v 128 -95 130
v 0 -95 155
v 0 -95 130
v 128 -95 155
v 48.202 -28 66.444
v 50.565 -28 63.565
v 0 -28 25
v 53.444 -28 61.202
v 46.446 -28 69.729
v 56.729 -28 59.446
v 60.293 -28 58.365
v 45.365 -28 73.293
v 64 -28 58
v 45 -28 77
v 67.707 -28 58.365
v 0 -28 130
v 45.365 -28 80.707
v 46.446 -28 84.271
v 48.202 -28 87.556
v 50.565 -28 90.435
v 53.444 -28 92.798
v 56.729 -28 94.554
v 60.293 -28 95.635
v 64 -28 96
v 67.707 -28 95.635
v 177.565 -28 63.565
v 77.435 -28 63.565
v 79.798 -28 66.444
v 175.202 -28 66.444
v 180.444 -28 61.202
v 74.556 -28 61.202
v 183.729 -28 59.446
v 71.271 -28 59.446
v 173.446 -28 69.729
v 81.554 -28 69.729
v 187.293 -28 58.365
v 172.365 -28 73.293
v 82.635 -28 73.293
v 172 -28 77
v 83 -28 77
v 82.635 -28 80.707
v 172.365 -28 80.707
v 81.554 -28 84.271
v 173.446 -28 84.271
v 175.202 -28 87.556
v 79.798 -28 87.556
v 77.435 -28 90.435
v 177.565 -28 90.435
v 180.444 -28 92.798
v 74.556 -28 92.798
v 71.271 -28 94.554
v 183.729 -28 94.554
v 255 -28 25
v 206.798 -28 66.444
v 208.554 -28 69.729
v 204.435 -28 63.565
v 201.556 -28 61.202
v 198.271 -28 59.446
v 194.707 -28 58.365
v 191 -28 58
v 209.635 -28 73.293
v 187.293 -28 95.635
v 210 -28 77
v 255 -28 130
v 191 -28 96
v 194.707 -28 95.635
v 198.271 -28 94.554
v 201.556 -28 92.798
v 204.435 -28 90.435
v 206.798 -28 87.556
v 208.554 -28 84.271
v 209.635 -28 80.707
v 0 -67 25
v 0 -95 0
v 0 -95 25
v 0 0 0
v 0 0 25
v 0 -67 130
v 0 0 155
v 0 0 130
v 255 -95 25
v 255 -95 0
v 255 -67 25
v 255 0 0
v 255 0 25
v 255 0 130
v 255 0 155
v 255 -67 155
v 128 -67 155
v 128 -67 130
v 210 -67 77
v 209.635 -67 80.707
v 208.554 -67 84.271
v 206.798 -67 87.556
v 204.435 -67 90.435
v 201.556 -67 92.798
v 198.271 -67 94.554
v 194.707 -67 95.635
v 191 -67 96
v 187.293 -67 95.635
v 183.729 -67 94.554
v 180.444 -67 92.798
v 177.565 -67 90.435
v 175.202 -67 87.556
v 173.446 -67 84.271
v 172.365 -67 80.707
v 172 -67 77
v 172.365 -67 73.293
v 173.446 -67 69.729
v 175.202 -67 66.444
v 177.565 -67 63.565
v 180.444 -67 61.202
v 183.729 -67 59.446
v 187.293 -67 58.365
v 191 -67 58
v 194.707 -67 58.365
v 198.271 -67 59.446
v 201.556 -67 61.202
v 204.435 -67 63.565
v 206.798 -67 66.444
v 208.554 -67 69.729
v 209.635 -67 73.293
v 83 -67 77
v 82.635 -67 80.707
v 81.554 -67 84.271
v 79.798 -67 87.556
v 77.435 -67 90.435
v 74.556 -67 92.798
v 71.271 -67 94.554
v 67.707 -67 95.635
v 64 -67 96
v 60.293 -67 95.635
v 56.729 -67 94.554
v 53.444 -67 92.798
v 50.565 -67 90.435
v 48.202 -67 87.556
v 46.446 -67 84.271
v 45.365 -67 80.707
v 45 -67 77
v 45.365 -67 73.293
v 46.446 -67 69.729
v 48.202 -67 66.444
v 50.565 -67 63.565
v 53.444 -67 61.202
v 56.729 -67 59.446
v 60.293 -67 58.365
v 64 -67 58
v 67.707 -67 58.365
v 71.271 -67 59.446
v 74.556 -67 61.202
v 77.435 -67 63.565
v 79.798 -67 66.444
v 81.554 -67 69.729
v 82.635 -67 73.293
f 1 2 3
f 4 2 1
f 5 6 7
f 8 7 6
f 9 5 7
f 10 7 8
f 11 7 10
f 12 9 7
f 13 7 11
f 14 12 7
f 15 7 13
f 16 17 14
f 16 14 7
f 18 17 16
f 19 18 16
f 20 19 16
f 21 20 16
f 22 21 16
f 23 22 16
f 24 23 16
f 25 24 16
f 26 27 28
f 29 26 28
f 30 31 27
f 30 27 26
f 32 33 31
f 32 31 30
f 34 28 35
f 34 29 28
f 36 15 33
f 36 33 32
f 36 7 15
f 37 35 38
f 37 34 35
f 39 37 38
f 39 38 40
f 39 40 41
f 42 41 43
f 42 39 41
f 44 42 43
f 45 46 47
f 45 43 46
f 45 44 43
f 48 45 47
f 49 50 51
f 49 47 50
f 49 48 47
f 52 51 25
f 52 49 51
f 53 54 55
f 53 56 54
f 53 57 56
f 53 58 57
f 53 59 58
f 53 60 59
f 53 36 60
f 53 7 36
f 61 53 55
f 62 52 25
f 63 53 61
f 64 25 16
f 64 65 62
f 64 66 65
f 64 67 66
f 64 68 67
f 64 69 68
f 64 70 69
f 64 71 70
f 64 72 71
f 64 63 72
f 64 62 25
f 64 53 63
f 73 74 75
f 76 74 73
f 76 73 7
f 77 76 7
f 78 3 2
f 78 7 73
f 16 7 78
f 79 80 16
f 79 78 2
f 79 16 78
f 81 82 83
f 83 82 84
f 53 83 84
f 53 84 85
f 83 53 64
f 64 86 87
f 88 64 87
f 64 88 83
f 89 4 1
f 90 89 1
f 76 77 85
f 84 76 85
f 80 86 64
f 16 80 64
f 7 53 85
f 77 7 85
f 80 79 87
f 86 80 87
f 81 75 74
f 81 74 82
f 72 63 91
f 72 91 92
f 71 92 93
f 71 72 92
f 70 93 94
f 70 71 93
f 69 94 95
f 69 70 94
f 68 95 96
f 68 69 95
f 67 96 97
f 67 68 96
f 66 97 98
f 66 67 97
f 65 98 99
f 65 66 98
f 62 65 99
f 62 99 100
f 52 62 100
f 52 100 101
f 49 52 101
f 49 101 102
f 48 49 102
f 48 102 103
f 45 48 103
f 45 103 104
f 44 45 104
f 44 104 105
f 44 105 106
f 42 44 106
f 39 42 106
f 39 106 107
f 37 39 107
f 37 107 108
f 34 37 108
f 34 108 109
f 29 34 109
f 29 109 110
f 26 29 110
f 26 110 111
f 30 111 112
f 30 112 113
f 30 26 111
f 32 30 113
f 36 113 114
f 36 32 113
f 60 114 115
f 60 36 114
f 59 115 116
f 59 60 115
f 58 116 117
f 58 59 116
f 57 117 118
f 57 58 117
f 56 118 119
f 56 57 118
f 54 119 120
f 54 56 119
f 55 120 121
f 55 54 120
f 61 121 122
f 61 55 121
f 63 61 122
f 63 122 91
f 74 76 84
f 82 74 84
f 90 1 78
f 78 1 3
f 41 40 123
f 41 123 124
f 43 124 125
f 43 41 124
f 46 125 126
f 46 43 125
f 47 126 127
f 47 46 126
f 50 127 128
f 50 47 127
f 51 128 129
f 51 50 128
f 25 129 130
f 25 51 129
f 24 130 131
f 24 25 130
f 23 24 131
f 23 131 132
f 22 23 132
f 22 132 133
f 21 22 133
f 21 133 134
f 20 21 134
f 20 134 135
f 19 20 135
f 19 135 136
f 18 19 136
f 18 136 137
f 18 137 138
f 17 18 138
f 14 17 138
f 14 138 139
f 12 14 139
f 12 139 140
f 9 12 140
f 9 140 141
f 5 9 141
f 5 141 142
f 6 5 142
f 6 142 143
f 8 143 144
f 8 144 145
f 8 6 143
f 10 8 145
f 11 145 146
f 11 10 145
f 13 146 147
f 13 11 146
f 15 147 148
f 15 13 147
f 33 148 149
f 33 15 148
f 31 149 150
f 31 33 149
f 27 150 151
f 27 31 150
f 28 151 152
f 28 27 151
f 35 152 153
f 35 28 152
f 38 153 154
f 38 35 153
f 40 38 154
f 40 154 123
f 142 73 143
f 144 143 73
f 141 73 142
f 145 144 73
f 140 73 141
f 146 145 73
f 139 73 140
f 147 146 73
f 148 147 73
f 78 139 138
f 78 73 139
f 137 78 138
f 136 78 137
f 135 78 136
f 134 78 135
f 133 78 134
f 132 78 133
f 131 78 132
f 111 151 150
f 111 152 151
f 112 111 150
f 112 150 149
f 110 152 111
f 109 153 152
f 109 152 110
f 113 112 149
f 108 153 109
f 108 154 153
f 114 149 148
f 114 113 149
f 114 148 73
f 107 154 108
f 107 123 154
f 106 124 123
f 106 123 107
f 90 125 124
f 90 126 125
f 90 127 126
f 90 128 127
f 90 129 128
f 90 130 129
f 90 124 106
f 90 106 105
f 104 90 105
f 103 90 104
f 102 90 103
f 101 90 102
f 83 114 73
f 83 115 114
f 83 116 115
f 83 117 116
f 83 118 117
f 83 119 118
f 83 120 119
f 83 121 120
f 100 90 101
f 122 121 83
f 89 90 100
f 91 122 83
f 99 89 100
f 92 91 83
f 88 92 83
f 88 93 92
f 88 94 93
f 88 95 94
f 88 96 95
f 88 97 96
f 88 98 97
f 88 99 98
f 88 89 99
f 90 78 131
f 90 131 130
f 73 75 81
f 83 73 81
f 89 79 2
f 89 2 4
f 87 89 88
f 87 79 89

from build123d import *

# Parameters (mm, degrees)
F0_W     = 255
F0_H     = 155
F0_R     = 19
F1_DEPTH = 95
F2_R     = 19
F2_W     = 50
F2_H     = 105
F2_W_2   = 127
F2_H_2   = 25
F3_DEPTH = 28
F4_W     = 41.4112506824
F4_H     = 105
F4_W_2   = 28
F5_DEPTH = 255.001


with BuildPart() as f1:
    # F0 (on Front) → F1 (new body)
    with BuildSketch(Plane.XZ):
        with Locations((127.5, 77.5)):
            Rectangle(F0_W, F0_H)
        with Locations((64, 77)):
            Circle(F0_R, mode=Mode.SUBTRACT)
        with Locations((191, 77)):
            Circle(F0_R, mode=Mode.SUBTRACT)
    extrude(amount=F1_DEPTH)

    # F2 (on face) → F3 (cut)
    with BuildSketch(Plane.XZ.offset(95)):
        Polygon((128, 130), (0, 130), (0, 25), (255, 25), (255, 130), align=None)
        with Locations((64, 77)):
            Circle(F2_R, mode=Mode.SUBTRACT)
        with Locations((191, 77)):
            Circle(F2_R, mode=Mode.SUBTRACT)
        with Locations((-25, 77.5)):
            Rectangle(F2_W, F2_H)
        with Locations((280, 77.5)):
            Rectangle(F2_W, F2_H)
        Polygon((255, 155), (255, 130), (305, 130), (305, 190.759062767), (128, 190.759062767), (128, 155), align=None)
        with Locations((191.5, 142.5)):
            Rectangle(F2_W_2, F2_H_2)
    extrude(amount=-F3_DEPTH, mode=Mode.SUBTRACT)

    # F4 (on face) → F5 (cut, through all)
    with BuildSketch(Plane.YZ.offset(255)):
        with Locations((20.7056253412, 77.5)):
            Rectangle(F4_W, F4_H)
        with Locations((-14, 77.5)):
            Rectangle(F4_W_2, F4_H)
    extrude(amount=-F5_DEPTH, mode=Mode.SUBTRACT)


solid = f1.part
